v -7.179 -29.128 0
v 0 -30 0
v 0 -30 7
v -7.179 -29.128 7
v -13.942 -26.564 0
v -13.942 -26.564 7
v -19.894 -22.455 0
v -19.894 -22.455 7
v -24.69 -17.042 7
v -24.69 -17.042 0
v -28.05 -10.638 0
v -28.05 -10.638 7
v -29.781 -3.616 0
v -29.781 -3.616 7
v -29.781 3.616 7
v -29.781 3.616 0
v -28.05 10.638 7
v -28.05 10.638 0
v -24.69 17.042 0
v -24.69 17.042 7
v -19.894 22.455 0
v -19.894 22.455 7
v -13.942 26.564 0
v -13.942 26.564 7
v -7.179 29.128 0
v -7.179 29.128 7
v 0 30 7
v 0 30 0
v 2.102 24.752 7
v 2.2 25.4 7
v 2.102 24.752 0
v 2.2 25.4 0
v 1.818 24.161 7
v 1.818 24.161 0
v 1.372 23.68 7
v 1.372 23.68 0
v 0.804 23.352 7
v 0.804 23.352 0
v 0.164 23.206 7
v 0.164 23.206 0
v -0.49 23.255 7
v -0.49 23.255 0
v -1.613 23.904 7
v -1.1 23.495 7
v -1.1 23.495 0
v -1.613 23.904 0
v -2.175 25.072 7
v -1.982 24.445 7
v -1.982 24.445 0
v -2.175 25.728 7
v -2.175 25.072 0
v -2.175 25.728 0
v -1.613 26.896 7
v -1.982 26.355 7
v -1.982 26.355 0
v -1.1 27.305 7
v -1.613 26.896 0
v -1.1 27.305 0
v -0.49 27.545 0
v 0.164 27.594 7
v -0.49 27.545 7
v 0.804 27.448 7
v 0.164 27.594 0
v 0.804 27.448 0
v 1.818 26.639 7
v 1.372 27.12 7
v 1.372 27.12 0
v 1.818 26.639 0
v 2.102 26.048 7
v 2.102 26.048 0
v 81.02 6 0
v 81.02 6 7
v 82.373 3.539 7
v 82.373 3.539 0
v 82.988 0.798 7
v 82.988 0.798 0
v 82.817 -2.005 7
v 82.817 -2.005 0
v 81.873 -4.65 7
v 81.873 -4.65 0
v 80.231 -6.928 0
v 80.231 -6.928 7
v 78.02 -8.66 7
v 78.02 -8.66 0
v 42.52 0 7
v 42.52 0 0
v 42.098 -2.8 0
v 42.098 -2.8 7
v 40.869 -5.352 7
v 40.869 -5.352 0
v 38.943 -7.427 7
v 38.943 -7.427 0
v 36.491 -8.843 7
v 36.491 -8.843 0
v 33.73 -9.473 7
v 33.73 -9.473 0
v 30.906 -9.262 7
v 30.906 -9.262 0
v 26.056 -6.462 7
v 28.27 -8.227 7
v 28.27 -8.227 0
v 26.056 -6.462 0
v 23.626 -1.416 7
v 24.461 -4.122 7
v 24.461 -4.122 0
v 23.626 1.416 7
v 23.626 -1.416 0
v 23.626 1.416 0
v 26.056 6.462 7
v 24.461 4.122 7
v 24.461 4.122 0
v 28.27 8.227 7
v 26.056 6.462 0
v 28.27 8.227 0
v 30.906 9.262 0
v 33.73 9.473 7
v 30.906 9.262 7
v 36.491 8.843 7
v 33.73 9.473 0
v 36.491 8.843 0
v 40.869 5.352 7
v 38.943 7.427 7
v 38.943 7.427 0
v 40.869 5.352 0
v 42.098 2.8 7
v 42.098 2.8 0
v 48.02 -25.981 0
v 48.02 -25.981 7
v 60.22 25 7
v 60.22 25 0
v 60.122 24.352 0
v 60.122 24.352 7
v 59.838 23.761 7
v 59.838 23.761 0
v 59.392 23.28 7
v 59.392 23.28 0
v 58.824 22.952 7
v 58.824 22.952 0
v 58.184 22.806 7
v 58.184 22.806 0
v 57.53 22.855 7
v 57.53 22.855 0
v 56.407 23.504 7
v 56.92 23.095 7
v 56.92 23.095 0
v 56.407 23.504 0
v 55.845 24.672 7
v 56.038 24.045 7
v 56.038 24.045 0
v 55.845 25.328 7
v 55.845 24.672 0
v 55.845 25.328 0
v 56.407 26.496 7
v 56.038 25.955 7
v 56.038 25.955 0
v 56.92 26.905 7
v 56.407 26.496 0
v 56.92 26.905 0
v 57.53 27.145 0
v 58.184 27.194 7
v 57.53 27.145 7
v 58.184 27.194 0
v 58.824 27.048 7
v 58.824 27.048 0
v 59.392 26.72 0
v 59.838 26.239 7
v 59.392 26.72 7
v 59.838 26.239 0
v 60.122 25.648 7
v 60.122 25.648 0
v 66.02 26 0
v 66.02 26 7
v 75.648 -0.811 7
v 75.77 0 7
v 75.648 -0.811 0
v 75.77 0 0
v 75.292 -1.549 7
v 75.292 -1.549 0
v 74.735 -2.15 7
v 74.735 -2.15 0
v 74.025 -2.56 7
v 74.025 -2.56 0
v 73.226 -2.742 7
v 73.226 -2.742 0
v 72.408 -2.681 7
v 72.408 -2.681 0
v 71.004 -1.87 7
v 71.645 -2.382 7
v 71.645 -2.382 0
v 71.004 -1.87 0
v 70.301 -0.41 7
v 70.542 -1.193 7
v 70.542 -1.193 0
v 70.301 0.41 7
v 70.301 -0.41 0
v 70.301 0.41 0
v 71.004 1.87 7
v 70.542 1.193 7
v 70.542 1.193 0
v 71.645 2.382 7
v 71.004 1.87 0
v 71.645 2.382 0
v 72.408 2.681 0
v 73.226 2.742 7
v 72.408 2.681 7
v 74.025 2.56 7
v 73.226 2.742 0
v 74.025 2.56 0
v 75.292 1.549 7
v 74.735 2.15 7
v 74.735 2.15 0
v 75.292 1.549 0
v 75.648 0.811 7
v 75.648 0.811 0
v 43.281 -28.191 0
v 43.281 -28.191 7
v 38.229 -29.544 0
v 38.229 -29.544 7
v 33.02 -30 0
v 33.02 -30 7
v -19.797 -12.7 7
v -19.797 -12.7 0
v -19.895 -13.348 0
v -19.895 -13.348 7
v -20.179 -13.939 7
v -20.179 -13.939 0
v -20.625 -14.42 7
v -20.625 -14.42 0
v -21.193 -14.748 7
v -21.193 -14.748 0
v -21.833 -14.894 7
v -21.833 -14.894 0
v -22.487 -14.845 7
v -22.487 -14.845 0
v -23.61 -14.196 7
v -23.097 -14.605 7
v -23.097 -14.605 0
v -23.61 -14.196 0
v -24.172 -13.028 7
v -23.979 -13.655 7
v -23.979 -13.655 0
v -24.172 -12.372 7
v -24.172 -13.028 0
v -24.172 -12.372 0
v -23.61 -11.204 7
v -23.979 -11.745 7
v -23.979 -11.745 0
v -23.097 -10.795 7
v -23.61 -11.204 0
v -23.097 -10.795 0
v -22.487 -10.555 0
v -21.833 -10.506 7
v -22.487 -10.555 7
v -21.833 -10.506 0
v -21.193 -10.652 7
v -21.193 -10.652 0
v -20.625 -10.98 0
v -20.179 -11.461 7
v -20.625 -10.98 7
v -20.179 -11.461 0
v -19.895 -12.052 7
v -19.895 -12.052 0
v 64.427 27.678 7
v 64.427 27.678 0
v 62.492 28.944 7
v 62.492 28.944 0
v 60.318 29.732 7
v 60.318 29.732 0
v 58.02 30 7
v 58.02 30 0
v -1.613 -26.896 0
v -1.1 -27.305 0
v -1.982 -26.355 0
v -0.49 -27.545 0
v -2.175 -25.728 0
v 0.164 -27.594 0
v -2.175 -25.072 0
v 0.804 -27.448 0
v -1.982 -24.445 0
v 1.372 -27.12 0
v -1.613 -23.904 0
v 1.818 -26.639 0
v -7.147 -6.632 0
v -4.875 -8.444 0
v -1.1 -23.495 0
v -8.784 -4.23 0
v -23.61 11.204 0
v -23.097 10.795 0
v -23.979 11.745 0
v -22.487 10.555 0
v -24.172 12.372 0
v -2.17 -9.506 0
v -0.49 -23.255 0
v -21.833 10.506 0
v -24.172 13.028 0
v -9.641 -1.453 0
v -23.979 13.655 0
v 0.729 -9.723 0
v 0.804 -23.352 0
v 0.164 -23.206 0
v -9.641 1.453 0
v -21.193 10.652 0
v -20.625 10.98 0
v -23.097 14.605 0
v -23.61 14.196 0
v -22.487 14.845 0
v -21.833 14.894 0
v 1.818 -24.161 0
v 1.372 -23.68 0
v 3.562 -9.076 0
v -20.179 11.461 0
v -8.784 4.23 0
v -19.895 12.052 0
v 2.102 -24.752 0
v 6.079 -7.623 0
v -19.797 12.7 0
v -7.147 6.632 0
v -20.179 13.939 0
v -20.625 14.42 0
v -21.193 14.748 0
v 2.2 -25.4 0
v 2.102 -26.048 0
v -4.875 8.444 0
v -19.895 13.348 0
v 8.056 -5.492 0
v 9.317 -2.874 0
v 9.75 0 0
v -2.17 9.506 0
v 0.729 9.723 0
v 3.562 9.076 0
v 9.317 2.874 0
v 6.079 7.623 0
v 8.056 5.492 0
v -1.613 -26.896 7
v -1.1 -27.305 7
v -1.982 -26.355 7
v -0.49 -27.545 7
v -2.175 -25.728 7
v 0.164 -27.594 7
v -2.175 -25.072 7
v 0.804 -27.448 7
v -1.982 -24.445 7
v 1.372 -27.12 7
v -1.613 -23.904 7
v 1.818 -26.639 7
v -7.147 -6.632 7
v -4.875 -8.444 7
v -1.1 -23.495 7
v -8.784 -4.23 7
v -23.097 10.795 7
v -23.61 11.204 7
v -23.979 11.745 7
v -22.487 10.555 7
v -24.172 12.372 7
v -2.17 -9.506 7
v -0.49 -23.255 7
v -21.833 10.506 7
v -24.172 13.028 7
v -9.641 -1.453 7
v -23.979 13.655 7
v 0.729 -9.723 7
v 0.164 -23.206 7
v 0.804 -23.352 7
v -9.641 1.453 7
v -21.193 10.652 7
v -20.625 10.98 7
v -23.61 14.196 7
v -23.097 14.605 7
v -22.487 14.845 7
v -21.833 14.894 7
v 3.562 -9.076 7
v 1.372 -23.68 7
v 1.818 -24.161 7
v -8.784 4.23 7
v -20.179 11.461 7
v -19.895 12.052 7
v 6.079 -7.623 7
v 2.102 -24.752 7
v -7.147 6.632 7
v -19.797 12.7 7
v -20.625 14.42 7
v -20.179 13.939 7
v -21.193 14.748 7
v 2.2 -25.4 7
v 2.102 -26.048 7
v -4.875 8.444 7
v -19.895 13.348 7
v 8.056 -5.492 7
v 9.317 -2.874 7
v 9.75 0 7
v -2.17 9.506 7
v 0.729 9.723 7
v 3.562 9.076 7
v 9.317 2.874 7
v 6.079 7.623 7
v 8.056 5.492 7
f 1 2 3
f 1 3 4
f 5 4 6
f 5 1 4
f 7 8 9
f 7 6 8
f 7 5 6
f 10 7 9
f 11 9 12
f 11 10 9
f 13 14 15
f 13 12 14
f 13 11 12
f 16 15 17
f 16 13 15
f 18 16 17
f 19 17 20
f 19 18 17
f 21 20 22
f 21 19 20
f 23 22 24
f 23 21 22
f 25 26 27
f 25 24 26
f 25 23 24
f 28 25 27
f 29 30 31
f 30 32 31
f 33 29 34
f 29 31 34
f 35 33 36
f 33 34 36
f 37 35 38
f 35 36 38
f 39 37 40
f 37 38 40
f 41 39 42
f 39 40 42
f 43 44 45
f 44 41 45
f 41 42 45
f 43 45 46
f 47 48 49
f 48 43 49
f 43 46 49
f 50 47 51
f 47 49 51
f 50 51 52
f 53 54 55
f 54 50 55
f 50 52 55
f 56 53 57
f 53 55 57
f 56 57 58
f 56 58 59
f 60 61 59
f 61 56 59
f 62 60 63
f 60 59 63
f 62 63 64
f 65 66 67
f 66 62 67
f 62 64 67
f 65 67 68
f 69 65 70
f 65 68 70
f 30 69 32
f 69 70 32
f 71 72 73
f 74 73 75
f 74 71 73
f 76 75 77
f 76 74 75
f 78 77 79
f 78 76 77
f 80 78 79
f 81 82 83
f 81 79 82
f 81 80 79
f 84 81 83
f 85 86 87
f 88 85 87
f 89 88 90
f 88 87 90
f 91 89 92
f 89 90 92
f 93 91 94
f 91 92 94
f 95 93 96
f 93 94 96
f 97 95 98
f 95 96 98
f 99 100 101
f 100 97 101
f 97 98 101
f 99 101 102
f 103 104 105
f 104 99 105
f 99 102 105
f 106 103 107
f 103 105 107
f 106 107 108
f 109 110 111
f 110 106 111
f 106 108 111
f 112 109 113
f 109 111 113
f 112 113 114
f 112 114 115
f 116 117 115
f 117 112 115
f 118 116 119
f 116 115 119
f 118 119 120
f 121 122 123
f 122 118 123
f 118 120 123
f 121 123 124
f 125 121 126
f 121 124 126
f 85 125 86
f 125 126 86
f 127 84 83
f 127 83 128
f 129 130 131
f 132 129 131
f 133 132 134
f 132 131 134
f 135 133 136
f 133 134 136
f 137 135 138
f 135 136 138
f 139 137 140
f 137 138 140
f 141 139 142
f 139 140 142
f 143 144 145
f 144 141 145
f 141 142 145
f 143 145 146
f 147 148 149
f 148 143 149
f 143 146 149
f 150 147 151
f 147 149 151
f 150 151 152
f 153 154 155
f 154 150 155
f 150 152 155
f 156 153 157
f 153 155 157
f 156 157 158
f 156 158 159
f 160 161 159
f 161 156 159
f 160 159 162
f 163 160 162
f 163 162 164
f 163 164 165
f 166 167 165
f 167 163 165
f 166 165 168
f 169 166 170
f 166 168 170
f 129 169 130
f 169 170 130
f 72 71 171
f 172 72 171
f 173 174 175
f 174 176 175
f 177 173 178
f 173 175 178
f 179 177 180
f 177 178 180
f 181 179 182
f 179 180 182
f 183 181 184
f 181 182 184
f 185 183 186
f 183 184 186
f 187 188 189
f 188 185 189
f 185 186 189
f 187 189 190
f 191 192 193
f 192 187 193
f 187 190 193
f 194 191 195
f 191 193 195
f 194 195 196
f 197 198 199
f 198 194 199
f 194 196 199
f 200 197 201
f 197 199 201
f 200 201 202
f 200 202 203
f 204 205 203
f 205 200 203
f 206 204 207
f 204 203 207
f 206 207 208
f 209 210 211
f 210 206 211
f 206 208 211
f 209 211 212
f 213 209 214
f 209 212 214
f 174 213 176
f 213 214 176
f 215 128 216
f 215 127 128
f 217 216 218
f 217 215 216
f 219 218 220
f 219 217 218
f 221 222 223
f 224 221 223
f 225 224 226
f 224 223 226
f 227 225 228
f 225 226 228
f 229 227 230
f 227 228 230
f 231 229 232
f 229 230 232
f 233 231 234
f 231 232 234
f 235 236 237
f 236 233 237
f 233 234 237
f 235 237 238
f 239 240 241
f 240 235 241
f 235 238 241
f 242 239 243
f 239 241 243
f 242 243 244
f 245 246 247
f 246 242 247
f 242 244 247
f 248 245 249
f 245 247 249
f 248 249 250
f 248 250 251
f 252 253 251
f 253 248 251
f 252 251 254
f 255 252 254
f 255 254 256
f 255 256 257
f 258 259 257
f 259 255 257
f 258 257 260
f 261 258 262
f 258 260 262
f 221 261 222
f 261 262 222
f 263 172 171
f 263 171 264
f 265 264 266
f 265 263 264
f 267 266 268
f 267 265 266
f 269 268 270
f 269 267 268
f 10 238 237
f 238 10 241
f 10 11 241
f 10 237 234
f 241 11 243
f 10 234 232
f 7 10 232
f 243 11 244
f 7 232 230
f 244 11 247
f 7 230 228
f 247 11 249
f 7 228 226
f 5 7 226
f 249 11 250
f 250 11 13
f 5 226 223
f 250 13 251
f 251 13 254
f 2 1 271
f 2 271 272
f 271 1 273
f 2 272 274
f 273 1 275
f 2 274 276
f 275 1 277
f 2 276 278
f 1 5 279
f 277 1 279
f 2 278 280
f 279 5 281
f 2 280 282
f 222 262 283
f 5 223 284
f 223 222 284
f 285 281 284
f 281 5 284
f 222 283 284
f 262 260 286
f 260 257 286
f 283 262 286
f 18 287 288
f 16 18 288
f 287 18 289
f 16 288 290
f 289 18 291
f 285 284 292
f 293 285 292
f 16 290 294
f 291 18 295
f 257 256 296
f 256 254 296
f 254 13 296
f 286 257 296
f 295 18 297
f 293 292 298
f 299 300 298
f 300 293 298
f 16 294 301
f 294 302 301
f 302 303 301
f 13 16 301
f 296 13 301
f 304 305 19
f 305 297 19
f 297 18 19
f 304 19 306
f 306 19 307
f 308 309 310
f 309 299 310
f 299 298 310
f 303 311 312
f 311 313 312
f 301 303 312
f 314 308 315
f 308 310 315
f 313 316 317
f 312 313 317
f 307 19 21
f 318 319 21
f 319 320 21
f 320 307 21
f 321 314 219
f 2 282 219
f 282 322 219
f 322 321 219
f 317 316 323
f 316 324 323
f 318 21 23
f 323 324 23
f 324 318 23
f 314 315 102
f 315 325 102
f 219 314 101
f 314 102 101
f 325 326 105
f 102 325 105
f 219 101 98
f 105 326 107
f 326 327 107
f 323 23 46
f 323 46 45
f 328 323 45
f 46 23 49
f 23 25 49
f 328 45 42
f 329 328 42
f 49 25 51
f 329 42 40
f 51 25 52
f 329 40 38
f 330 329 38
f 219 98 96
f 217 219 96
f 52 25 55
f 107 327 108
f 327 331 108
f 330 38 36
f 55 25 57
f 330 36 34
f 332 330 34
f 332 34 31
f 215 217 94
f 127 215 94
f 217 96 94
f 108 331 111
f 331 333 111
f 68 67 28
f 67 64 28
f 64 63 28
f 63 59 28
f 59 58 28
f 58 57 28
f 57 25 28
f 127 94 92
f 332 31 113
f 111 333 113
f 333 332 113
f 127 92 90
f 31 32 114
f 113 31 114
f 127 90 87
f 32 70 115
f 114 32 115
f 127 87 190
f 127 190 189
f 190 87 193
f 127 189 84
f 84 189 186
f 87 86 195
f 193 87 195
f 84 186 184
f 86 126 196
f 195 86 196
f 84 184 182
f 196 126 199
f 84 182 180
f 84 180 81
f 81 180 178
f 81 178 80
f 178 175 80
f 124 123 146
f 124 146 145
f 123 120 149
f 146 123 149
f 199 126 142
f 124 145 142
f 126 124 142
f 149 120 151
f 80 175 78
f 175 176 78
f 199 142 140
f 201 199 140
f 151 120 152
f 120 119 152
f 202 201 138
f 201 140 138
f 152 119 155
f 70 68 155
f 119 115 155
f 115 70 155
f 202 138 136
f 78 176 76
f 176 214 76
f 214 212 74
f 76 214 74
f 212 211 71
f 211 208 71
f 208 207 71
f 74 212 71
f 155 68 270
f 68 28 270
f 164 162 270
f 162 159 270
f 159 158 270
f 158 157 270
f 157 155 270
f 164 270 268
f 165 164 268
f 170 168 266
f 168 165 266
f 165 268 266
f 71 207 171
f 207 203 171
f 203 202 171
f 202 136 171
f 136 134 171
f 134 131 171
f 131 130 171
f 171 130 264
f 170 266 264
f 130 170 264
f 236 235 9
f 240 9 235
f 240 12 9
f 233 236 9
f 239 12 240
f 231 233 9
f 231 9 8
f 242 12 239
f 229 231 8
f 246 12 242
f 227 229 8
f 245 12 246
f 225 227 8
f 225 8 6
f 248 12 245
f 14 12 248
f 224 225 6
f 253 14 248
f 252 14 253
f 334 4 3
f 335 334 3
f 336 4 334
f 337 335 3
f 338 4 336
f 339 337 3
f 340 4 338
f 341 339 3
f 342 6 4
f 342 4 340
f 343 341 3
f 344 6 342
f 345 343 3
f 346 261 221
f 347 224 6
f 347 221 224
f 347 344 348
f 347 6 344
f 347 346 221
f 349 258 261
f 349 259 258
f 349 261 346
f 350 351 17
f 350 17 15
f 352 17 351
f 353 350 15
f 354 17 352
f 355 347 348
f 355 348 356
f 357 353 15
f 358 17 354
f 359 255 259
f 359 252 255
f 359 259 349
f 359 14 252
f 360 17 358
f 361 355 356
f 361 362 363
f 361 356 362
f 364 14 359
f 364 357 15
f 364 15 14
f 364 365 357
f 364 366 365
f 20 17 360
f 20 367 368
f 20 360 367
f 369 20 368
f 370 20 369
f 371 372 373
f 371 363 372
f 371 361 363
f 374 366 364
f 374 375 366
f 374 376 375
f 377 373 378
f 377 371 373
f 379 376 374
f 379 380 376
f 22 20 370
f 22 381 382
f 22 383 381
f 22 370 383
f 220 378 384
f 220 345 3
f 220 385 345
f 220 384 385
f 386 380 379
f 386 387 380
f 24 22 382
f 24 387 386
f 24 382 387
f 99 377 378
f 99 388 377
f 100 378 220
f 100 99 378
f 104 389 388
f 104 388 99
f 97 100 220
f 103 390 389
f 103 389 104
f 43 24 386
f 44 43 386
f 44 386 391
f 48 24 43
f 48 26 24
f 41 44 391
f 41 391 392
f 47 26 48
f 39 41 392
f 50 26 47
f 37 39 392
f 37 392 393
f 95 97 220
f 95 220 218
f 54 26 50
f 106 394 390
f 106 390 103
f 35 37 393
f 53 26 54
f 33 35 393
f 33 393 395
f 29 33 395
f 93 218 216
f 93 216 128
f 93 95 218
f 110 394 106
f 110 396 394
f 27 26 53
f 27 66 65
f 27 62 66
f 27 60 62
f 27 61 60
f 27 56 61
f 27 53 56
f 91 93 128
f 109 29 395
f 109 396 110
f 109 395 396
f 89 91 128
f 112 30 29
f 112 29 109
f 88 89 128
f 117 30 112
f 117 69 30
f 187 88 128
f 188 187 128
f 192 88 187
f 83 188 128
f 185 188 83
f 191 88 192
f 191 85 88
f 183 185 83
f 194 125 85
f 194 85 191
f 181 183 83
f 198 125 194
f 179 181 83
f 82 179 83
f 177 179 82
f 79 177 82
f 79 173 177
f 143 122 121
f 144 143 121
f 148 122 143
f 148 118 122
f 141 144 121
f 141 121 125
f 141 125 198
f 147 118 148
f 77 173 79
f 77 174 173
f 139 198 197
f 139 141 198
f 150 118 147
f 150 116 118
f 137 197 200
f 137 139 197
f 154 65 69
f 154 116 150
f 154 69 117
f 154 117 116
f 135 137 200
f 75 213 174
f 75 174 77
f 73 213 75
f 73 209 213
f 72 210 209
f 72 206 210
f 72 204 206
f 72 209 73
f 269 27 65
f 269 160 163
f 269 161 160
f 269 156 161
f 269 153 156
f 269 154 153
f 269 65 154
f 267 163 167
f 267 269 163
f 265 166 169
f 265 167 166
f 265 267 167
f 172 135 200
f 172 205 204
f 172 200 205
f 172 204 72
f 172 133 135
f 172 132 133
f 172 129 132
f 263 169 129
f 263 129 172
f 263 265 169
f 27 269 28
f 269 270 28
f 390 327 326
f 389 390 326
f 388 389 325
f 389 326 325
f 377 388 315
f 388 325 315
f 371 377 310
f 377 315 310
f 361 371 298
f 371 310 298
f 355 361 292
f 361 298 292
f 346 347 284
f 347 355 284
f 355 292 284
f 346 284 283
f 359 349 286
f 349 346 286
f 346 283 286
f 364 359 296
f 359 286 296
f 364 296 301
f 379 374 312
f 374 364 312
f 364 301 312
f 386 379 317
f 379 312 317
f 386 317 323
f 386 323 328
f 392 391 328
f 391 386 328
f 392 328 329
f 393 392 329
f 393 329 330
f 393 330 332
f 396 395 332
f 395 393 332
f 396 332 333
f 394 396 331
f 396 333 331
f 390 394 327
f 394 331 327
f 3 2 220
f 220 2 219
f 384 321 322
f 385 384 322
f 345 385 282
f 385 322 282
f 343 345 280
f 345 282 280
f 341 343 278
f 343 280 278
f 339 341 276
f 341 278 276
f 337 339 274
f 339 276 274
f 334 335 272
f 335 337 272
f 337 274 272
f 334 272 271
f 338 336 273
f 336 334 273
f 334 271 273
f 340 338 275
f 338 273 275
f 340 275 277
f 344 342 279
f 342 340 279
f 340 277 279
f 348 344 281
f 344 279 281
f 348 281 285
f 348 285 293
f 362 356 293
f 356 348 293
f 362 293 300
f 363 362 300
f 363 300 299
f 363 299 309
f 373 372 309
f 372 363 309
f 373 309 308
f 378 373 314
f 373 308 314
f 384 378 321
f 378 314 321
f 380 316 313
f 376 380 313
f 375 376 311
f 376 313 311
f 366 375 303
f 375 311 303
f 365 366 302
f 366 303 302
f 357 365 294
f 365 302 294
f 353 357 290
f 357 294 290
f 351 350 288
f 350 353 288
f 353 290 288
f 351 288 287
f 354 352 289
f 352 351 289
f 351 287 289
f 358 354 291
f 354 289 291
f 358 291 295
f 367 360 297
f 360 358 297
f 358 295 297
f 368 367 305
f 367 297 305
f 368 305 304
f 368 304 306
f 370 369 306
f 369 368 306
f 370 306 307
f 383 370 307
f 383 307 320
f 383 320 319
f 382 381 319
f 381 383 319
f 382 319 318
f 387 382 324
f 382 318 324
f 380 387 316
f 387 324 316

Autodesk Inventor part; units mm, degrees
ref_plane "YZ Plane" through (0, 0, 0) normal (1, 0, 0) x (0, 1, 0)
ref_plane "XZ Plane" through (0, 0, 0) normal (0, 1, 0) x (-1, 0, 0)
ref_plane "XY Plane" through (0, 0, 0) normal (0, 0, 1) x (1, 0, 0)
sketch "Sketch1" plane through (0, 0, 0) normal (0, 0, 1) x (1, 0, 0)
  circle A0 centre (0, 0) radius 7.62 construction
  circle A1 centre (0, 0) radius 9.75
  circle A2 centre (33.02, 0) radius 25.4 construction
  line L0 (0, 0) -> (7.62, 0)
  line L1 (0, 0) -> (7.62, 0) construction
  circle A3 centre (33.02, 0) radius 9.5
  line L2 (0, -30) -> (33.02, -30)
  line L3 (33.02, 30) -> (0, 30)
  arc A4 (33.02, -30) -> (63.02, 0) centre (33.02, 0) ccw
  arc A5 (0, 30) -> (0, -30) centre (0, 0) ccw
  circle A6 centre (0, 0) radius 25.4 construction
  line L4 (0, 25.4) -> (0, 0) construction
  line L5 (0, 25.4) -> (25.4, 25.4) construction
  circle A7 centre (0, 25.4) radius 2.2
  circle A8 centre (-21.997, 12.7) radius 2.2
  circle A9 centre (-21.997, -12.7) radius 2.2
  circle A10 centre (0, -25.4) radius 2.2
  circle A11 centre (21.997, -12.7) radius 2.2
  circle A12 centre (21.997, 12.7) radius 2.2
  line L6 (63.02, 0) -> (63.02, 30)
  line L7 (63.02, 30) -> (33.02, 30)
  circle A13 centre (58.02, 25) radius 2.2
  circle A14 centre (73.02, 0) radius 2.75
  circle A15 centre (73.02, 0) radius 10
  line L8 (81.02, 6) -> (63.02, 30)
  line L9 (78.02, -8.6603) -> (48.02, -25.9808)
  dimension "d13" = 50.8
  dimension "d0" = 15.24
  dimension "d1" = 19.5
  dimension "d2" = 50.8
  dimension "d3" = 7.62
  dimension "d4" = 0
  dimension "d5" = 33.02
  dimension "d6" = 19
  dimension "d9" = 30
  dimension "d10" = 60
  dimension "d14" = 25.4
  dimension "d15" = 90
  dimension "d16" = 4.4
  dimension "d19" = 360
  dimension "d21" = 30
  dimension "d22" = 30
  dimension "d26" = 90
  dimension "d28" = 4.4
  dimension "d29" = 5
  dimension "d30" = 5
  dimension "d38" = 5.5
  dimension "d39" = 10
  dimension "d40" = 20
extrude "Extrusion1" add sketch "Sketch1" along normal blind 7 contours A5 L3 L7 L6 A4 L2 | A4 A15 L9 | L6 L8 A15 | A15 | A11 | A12
fillet "Fillet2" radius 10 1 edges at (63.02, 30, 3.5)
properties part number "Inner Plate" material "Aluminum 6061"
